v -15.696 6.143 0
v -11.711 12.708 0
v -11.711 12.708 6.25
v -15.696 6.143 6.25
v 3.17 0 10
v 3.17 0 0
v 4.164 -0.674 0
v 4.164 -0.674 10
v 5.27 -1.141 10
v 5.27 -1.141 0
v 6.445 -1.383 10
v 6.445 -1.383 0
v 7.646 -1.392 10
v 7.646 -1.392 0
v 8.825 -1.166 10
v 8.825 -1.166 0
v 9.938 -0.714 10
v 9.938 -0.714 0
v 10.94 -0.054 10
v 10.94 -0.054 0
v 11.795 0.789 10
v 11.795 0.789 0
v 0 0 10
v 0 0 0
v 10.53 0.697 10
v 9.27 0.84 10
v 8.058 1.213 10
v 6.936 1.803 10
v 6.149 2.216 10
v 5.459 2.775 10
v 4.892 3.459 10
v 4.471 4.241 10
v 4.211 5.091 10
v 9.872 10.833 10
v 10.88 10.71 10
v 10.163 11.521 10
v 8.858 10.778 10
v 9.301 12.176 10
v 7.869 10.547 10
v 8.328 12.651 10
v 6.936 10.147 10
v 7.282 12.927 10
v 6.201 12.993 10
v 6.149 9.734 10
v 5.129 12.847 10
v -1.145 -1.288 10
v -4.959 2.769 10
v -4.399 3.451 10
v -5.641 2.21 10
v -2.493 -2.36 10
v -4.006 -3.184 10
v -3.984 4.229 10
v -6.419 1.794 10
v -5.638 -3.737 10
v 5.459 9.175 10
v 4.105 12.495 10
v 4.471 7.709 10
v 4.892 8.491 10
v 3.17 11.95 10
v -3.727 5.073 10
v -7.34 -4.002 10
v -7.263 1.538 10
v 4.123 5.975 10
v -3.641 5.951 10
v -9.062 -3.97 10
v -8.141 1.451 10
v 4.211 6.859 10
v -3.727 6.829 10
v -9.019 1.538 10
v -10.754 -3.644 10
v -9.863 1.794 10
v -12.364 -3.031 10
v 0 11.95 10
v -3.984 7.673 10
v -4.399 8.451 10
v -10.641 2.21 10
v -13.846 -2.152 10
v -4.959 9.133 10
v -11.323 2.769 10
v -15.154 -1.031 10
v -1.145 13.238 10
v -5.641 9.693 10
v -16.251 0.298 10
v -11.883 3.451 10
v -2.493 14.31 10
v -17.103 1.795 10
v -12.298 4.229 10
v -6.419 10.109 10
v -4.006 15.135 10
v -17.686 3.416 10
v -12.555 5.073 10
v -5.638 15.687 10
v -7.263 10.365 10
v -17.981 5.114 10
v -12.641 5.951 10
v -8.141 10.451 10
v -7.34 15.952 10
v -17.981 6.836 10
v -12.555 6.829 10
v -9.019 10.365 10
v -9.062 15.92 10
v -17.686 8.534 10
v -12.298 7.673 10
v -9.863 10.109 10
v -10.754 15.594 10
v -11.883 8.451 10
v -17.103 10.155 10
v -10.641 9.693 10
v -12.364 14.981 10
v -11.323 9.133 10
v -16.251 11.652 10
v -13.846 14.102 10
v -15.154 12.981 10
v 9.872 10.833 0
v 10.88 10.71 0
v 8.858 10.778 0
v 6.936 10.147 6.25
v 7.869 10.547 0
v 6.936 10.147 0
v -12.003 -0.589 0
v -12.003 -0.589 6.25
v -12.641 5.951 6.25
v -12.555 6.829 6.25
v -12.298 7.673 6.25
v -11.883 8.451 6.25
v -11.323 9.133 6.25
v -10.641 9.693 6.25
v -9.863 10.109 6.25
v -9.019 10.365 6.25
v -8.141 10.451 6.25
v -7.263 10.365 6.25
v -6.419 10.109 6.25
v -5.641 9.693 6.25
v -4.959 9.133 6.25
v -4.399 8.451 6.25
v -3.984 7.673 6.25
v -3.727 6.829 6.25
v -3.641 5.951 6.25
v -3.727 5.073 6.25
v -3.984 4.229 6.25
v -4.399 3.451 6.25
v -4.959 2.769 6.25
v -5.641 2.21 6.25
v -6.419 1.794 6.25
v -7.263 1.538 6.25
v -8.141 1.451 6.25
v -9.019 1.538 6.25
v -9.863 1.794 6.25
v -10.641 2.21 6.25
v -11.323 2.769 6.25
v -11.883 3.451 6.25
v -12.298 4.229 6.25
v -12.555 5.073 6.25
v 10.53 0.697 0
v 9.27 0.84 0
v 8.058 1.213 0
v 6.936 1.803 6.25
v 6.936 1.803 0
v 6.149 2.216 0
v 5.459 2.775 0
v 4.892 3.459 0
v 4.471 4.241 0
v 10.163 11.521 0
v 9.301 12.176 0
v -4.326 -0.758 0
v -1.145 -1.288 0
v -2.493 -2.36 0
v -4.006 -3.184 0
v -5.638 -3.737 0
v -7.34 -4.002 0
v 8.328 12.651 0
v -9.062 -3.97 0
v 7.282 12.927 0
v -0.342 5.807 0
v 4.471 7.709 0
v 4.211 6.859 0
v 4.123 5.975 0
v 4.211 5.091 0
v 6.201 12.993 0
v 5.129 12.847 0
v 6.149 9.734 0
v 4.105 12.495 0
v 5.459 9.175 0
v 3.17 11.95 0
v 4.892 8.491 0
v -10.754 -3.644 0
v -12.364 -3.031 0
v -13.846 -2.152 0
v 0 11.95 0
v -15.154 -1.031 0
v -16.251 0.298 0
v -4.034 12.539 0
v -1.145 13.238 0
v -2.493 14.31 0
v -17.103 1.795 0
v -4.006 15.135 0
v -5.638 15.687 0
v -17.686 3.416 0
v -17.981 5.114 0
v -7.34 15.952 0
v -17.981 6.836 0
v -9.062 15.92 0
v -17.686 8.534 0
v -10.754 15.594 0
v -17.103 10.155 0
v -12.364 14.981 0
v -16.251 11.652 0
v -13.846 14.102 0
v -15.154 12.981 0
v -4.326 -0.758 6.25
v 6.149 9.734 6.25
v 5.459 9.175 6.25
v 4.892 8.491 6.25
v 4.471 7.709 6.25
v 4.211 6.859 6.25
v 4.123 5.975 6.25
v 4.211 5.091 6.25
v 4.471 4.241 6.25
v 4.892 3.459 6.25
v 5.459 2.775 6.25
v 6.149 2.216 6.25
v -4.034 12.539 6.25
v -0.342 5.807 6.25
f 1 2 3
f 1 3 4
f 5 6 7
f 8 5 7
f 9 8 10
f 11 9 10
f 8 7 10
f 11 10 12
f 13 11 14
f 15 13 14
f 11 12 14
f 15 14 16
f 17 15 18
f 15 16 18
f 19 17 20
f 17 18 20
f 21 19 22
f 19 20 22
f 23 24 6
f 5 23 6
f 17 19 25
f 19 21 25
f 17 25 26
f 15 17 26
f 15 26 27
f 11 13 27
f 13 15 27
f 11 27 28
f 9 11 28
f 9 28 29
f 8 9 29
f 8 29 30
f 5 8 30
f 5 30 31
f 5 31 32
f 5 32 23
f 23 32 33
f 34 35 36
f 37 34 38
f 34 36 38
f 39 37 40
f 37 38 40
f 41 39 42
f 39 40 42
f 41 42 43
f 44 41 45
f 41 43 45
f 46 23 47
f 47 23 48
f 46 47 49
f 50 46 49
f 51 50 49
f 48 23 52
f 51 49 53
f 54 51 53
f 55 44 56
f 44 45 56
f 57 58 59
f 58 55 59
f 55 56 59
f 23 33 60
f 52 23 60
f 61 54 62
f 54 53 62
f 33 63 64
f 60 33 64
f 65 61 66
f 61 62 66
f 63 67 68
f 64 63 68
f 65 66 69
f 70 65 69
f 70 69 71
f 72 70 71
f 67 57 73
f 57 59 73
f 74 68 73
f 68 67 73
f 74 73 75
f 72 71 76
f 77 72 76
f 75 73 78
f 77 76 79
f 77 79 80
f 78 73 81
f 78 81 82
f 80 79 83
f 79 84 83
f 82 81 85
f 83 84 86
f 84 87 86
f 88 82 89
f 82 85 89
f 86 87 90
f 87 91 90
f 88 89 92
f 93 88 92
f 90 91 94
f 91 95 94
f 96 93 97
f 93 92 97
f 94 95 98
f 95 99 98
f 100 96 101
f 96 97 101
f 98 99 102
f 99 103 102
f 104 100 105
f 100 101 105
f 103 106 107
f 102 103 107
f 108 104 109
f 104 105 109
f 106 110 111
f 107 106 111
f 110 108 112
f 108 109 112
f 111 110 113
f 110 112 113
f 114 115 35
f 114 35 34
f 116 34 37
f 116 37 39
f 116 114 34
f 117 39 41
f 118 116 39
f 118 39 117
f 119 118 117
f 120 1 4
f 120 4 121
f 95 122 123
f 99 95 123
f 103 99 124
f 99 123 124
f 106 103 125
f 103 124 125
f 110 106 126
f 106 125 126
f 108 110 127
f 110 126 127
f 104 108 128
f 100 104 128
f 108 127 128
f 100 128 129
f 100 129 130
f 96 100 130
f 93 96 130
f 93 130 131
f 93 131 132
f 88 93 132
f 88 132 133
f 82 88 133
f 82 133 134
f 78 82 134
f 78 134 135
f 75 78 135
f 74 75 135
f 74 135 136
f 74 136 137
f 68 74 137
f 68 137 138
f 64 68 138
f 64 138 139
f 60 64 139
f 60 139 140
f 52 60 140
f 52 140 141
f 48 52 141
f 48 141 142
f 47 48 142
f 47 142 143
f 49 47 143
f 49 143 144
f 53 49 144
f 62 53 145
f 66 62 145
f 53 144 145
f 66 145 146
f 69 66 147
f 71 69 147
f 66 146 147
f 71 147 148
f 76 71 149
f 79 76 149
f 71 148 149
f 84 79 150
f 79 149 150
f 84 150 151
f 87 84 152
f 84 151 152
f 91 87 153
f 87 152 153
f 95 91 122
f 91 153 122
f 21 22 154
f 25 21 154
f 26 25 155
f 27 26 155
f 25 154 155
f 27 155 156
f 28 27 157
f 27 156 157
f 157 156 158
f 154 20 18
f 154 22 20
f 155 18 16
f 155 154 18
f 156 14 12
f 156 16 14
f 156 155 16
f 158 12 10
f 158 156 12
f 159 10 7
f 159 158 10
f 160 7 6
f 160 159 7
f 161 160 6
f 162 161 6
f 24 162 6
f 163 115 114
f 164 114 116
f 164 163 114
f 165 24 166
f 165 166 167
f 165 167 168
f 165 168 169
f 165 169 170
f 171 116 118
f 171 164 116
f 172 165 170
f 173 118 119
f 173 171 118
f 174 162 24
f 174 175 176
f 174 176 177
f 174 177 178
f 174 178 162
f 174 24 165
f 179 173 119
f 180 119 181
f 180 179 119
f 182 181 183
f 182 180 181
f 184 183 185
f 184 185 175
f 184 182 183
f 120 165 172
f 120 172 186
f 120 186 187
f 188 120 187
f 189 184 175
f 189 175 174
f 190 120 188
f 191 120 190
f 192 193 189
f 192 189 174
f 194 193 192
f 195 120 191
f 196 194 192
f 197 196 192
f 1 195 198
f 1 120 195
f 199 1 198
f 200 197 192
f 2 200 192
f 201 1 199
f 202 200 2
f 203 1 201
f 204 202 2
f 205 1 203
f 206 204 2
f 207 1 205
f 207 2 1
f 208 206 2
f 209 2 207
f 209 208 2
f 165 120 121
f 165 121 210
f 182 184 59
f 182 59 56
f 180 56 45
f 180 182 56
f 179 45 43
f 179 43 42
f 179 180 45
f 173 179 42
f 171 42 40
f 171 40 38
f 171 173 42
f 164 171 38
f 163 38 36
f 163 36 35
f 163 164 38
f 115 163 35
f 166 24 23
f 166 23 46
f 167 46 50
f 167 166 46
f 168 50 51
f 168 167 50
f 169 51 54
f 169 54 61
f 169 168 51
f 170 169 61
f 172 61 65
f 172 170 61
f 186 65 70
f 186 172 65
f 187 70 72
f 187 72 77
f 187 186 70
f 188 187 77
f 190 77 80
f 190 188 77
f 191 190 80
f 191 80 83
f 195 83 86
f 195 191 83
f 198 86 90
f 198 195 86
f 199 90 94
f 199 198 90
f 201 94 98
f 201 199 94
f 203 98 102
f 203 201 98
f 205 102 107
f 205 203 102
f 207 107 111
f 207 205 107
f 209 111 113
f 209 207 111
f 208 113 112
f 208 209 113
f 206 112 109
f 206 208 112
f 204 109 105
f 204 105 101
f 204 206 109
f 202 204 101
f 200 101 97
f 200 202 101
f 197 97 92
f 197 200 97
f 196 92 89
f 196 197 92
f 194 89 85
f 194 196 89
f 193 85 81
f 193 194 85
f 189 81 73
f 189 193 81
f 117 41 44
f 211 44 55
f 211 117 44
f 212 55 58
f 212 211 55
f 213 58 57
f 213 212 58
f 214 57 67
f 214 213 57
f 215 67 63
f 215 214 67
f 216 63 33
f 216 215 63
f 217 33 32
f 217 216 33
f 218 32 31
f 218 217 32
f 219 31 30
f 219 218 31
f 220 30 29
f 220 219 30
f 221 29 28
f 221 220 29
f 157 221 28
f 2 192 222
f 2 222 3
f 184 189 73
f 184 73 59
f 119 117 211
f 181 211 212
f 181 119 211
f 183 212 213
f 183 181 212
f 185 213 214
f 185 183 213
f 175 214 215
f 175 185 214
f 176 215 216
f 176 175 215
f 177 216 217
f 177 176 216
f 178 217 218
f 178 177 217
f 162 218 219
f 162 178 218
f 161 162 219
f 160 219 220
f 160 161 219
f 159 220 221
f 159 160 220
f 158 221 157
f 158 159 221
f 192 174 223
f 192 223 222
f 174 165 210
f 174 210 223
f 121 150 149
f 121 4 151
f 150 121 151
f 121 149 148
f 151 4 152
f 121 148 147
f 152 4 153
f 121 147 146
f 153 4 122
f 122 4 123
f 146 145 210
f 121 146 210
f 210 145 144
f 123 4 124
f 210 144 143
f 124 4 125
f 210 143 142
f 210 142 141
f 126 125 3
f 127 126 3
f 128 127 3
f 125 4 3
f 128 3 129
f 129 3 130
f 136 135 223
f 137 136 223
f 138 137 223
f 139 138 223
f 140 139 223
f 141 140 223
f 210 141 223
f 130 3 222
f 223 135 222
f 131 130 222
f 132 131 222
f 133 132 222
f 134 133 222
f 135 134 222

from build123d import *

# Parameters (mm, degrees)
ESQUISSE1_W             = 3.17
ESQUISSE1_H             = 11.950083308
BOSS_EXTRU_1_DEPTH      = 10
ESQUISSE3_R             = 4.5
ENL_V_MAT_EXTRU_1_DEPTH = 6.25
ESQUISSE4_R             = 4.5
ENL_V_MAT_EXTRU_2_DEPTH = 10
ENL_V_MAT_EXTRU_4_DEPTH = 10
BOSS_EXTRU_3_DEPTH      = 10
BOSS_EXTRU_4_DEPTH      = 10


with BuildPart() as part:
    # Esquisse1 → Boss.-Extru.1 (new body)
    with BuildSketch(Plane.XY):
        with Locations((1.585, 5.975041654)):
            Rectangle(ESQUISSE1_W, ESQUISSE1_H)
        with BuildLine():
            ThreePointArc((0, 0), (-18.018658069, 5.975041654), (0, 11.950083308))
            Line((0, 11.950083308), (0, 0))
        make_face()
        with BuildLine():
            ThreePointArc((3.17, 11.950083308), (8.623303343, 5.975041654), (3.17, 0))
            Line((3.17, 0), (3.17, 11.950083308))
        make_face()
    extrude(amount=BOSS_EXTRU_1_DEPTH)

    # Esquisse3 → Enlèv. mat.-Extru.1 (cut)
    with BuildSketch(Plane.XY):
        with Locations((8.623303343, 5.975041654)):
            Circle(ESQUISSE3_R)
        Polygon((-4.326089499, -0.75758567), (-0.341747487, 5.806586179), (-4.034316058, 12.539213503), (-11.71122664, 12.707668978), (-15.695568652, 6.143497129), (-12.003000081, -0.589130195), align=None)
    extrude(amount=ENL_V_MAT_EXTRU_1_DEPTH, mode=Mode.SUBTRACT)

    # Esquisse4 → Enlèv. mat.-Extru.2 (cut)
    with BuildSketch(Plane(origin=(0, 0, 6.25), x_dir=(-1, 0, 0), z_dir=(0, 0, -1))):
        with Locations((8.141028583, 5.951350622)):
            Circle(ESQUISSE4_R)
    extrude(amount=-ENL_V_MAT_EXTRU_2_DEPTH, mode=Mode.SUBTRACT)

    # Esquisse6 → Enlèv. mat.-Extru.4 (cut)
    with BuildSketch(Plane(origin=(0, 0, 6.25), x_dir=(-1, 0, 0), z_dir=(0, 0, -1))):
        with BuildLine():
            ThreePointArc((-6.935803343, 1.803430005), (-8.623303343, 5.975041654), (-6.935803343, 10.146653303))
            ThreePointArc((-6.935803343, 10.146653303), (-4.123303343, 5.975041654), (-6.935803343, 1.803430005))
        make_face()
    extrude(amount=-ENL_V_MAT_EXTRU_4_DEPTH, mode=Mode.SUBTRACT)

    # Esquisse7 → Boss.-Extru.3 (add)
    with BuildSketch(Plane(origin=(0, 0, 0), x_dir=(-1, 0, 0), z_dir=(0, 0, -1))):
        with BuildLine():
            ThreePointArc((-3.17, 0), (-7.646039968, -1.391747442), (-11.795192237, 0.789176718))
            ThreePointArc((-11.795192237, 0.789176718), (-9.270284793, 0.840128378), (-6.935803343, 1.803430005))
            ThreePointArc((-6.935803343, 1.803430005), (-5.214835319, 0.563575862), (-3.17, 0))
        make_face()
    extrude(amount=-BOSS_EXTRU_3_DEPTH)

    # Esquisse8 → Boss.-Extru.4 (add)
    with BuildSketch(Plane(origin=(0, 0, 0), x_dir=(-1, 0, 0), z_dir=(0, 0, -1))):
        with BuildLine():
            ThreePointArc((-3.17, 11.950083308), (-7.281636762, 12.926912072), (-10.879725241, 10.71026808))
            ThreePointArc((-10.879725241, 10.71026808), (-8.857814072, 10.77798979), (-6.935803343, 10.146653303))
            ThreePointArc((-6.935803343, 10.146653303), (-5.214835319, 11.386507446), (-3.17, 11.950083308))
        make_face()
    extrude(amount=-BOSS_EXTRU_4_DEPTH)


solid = part.part
